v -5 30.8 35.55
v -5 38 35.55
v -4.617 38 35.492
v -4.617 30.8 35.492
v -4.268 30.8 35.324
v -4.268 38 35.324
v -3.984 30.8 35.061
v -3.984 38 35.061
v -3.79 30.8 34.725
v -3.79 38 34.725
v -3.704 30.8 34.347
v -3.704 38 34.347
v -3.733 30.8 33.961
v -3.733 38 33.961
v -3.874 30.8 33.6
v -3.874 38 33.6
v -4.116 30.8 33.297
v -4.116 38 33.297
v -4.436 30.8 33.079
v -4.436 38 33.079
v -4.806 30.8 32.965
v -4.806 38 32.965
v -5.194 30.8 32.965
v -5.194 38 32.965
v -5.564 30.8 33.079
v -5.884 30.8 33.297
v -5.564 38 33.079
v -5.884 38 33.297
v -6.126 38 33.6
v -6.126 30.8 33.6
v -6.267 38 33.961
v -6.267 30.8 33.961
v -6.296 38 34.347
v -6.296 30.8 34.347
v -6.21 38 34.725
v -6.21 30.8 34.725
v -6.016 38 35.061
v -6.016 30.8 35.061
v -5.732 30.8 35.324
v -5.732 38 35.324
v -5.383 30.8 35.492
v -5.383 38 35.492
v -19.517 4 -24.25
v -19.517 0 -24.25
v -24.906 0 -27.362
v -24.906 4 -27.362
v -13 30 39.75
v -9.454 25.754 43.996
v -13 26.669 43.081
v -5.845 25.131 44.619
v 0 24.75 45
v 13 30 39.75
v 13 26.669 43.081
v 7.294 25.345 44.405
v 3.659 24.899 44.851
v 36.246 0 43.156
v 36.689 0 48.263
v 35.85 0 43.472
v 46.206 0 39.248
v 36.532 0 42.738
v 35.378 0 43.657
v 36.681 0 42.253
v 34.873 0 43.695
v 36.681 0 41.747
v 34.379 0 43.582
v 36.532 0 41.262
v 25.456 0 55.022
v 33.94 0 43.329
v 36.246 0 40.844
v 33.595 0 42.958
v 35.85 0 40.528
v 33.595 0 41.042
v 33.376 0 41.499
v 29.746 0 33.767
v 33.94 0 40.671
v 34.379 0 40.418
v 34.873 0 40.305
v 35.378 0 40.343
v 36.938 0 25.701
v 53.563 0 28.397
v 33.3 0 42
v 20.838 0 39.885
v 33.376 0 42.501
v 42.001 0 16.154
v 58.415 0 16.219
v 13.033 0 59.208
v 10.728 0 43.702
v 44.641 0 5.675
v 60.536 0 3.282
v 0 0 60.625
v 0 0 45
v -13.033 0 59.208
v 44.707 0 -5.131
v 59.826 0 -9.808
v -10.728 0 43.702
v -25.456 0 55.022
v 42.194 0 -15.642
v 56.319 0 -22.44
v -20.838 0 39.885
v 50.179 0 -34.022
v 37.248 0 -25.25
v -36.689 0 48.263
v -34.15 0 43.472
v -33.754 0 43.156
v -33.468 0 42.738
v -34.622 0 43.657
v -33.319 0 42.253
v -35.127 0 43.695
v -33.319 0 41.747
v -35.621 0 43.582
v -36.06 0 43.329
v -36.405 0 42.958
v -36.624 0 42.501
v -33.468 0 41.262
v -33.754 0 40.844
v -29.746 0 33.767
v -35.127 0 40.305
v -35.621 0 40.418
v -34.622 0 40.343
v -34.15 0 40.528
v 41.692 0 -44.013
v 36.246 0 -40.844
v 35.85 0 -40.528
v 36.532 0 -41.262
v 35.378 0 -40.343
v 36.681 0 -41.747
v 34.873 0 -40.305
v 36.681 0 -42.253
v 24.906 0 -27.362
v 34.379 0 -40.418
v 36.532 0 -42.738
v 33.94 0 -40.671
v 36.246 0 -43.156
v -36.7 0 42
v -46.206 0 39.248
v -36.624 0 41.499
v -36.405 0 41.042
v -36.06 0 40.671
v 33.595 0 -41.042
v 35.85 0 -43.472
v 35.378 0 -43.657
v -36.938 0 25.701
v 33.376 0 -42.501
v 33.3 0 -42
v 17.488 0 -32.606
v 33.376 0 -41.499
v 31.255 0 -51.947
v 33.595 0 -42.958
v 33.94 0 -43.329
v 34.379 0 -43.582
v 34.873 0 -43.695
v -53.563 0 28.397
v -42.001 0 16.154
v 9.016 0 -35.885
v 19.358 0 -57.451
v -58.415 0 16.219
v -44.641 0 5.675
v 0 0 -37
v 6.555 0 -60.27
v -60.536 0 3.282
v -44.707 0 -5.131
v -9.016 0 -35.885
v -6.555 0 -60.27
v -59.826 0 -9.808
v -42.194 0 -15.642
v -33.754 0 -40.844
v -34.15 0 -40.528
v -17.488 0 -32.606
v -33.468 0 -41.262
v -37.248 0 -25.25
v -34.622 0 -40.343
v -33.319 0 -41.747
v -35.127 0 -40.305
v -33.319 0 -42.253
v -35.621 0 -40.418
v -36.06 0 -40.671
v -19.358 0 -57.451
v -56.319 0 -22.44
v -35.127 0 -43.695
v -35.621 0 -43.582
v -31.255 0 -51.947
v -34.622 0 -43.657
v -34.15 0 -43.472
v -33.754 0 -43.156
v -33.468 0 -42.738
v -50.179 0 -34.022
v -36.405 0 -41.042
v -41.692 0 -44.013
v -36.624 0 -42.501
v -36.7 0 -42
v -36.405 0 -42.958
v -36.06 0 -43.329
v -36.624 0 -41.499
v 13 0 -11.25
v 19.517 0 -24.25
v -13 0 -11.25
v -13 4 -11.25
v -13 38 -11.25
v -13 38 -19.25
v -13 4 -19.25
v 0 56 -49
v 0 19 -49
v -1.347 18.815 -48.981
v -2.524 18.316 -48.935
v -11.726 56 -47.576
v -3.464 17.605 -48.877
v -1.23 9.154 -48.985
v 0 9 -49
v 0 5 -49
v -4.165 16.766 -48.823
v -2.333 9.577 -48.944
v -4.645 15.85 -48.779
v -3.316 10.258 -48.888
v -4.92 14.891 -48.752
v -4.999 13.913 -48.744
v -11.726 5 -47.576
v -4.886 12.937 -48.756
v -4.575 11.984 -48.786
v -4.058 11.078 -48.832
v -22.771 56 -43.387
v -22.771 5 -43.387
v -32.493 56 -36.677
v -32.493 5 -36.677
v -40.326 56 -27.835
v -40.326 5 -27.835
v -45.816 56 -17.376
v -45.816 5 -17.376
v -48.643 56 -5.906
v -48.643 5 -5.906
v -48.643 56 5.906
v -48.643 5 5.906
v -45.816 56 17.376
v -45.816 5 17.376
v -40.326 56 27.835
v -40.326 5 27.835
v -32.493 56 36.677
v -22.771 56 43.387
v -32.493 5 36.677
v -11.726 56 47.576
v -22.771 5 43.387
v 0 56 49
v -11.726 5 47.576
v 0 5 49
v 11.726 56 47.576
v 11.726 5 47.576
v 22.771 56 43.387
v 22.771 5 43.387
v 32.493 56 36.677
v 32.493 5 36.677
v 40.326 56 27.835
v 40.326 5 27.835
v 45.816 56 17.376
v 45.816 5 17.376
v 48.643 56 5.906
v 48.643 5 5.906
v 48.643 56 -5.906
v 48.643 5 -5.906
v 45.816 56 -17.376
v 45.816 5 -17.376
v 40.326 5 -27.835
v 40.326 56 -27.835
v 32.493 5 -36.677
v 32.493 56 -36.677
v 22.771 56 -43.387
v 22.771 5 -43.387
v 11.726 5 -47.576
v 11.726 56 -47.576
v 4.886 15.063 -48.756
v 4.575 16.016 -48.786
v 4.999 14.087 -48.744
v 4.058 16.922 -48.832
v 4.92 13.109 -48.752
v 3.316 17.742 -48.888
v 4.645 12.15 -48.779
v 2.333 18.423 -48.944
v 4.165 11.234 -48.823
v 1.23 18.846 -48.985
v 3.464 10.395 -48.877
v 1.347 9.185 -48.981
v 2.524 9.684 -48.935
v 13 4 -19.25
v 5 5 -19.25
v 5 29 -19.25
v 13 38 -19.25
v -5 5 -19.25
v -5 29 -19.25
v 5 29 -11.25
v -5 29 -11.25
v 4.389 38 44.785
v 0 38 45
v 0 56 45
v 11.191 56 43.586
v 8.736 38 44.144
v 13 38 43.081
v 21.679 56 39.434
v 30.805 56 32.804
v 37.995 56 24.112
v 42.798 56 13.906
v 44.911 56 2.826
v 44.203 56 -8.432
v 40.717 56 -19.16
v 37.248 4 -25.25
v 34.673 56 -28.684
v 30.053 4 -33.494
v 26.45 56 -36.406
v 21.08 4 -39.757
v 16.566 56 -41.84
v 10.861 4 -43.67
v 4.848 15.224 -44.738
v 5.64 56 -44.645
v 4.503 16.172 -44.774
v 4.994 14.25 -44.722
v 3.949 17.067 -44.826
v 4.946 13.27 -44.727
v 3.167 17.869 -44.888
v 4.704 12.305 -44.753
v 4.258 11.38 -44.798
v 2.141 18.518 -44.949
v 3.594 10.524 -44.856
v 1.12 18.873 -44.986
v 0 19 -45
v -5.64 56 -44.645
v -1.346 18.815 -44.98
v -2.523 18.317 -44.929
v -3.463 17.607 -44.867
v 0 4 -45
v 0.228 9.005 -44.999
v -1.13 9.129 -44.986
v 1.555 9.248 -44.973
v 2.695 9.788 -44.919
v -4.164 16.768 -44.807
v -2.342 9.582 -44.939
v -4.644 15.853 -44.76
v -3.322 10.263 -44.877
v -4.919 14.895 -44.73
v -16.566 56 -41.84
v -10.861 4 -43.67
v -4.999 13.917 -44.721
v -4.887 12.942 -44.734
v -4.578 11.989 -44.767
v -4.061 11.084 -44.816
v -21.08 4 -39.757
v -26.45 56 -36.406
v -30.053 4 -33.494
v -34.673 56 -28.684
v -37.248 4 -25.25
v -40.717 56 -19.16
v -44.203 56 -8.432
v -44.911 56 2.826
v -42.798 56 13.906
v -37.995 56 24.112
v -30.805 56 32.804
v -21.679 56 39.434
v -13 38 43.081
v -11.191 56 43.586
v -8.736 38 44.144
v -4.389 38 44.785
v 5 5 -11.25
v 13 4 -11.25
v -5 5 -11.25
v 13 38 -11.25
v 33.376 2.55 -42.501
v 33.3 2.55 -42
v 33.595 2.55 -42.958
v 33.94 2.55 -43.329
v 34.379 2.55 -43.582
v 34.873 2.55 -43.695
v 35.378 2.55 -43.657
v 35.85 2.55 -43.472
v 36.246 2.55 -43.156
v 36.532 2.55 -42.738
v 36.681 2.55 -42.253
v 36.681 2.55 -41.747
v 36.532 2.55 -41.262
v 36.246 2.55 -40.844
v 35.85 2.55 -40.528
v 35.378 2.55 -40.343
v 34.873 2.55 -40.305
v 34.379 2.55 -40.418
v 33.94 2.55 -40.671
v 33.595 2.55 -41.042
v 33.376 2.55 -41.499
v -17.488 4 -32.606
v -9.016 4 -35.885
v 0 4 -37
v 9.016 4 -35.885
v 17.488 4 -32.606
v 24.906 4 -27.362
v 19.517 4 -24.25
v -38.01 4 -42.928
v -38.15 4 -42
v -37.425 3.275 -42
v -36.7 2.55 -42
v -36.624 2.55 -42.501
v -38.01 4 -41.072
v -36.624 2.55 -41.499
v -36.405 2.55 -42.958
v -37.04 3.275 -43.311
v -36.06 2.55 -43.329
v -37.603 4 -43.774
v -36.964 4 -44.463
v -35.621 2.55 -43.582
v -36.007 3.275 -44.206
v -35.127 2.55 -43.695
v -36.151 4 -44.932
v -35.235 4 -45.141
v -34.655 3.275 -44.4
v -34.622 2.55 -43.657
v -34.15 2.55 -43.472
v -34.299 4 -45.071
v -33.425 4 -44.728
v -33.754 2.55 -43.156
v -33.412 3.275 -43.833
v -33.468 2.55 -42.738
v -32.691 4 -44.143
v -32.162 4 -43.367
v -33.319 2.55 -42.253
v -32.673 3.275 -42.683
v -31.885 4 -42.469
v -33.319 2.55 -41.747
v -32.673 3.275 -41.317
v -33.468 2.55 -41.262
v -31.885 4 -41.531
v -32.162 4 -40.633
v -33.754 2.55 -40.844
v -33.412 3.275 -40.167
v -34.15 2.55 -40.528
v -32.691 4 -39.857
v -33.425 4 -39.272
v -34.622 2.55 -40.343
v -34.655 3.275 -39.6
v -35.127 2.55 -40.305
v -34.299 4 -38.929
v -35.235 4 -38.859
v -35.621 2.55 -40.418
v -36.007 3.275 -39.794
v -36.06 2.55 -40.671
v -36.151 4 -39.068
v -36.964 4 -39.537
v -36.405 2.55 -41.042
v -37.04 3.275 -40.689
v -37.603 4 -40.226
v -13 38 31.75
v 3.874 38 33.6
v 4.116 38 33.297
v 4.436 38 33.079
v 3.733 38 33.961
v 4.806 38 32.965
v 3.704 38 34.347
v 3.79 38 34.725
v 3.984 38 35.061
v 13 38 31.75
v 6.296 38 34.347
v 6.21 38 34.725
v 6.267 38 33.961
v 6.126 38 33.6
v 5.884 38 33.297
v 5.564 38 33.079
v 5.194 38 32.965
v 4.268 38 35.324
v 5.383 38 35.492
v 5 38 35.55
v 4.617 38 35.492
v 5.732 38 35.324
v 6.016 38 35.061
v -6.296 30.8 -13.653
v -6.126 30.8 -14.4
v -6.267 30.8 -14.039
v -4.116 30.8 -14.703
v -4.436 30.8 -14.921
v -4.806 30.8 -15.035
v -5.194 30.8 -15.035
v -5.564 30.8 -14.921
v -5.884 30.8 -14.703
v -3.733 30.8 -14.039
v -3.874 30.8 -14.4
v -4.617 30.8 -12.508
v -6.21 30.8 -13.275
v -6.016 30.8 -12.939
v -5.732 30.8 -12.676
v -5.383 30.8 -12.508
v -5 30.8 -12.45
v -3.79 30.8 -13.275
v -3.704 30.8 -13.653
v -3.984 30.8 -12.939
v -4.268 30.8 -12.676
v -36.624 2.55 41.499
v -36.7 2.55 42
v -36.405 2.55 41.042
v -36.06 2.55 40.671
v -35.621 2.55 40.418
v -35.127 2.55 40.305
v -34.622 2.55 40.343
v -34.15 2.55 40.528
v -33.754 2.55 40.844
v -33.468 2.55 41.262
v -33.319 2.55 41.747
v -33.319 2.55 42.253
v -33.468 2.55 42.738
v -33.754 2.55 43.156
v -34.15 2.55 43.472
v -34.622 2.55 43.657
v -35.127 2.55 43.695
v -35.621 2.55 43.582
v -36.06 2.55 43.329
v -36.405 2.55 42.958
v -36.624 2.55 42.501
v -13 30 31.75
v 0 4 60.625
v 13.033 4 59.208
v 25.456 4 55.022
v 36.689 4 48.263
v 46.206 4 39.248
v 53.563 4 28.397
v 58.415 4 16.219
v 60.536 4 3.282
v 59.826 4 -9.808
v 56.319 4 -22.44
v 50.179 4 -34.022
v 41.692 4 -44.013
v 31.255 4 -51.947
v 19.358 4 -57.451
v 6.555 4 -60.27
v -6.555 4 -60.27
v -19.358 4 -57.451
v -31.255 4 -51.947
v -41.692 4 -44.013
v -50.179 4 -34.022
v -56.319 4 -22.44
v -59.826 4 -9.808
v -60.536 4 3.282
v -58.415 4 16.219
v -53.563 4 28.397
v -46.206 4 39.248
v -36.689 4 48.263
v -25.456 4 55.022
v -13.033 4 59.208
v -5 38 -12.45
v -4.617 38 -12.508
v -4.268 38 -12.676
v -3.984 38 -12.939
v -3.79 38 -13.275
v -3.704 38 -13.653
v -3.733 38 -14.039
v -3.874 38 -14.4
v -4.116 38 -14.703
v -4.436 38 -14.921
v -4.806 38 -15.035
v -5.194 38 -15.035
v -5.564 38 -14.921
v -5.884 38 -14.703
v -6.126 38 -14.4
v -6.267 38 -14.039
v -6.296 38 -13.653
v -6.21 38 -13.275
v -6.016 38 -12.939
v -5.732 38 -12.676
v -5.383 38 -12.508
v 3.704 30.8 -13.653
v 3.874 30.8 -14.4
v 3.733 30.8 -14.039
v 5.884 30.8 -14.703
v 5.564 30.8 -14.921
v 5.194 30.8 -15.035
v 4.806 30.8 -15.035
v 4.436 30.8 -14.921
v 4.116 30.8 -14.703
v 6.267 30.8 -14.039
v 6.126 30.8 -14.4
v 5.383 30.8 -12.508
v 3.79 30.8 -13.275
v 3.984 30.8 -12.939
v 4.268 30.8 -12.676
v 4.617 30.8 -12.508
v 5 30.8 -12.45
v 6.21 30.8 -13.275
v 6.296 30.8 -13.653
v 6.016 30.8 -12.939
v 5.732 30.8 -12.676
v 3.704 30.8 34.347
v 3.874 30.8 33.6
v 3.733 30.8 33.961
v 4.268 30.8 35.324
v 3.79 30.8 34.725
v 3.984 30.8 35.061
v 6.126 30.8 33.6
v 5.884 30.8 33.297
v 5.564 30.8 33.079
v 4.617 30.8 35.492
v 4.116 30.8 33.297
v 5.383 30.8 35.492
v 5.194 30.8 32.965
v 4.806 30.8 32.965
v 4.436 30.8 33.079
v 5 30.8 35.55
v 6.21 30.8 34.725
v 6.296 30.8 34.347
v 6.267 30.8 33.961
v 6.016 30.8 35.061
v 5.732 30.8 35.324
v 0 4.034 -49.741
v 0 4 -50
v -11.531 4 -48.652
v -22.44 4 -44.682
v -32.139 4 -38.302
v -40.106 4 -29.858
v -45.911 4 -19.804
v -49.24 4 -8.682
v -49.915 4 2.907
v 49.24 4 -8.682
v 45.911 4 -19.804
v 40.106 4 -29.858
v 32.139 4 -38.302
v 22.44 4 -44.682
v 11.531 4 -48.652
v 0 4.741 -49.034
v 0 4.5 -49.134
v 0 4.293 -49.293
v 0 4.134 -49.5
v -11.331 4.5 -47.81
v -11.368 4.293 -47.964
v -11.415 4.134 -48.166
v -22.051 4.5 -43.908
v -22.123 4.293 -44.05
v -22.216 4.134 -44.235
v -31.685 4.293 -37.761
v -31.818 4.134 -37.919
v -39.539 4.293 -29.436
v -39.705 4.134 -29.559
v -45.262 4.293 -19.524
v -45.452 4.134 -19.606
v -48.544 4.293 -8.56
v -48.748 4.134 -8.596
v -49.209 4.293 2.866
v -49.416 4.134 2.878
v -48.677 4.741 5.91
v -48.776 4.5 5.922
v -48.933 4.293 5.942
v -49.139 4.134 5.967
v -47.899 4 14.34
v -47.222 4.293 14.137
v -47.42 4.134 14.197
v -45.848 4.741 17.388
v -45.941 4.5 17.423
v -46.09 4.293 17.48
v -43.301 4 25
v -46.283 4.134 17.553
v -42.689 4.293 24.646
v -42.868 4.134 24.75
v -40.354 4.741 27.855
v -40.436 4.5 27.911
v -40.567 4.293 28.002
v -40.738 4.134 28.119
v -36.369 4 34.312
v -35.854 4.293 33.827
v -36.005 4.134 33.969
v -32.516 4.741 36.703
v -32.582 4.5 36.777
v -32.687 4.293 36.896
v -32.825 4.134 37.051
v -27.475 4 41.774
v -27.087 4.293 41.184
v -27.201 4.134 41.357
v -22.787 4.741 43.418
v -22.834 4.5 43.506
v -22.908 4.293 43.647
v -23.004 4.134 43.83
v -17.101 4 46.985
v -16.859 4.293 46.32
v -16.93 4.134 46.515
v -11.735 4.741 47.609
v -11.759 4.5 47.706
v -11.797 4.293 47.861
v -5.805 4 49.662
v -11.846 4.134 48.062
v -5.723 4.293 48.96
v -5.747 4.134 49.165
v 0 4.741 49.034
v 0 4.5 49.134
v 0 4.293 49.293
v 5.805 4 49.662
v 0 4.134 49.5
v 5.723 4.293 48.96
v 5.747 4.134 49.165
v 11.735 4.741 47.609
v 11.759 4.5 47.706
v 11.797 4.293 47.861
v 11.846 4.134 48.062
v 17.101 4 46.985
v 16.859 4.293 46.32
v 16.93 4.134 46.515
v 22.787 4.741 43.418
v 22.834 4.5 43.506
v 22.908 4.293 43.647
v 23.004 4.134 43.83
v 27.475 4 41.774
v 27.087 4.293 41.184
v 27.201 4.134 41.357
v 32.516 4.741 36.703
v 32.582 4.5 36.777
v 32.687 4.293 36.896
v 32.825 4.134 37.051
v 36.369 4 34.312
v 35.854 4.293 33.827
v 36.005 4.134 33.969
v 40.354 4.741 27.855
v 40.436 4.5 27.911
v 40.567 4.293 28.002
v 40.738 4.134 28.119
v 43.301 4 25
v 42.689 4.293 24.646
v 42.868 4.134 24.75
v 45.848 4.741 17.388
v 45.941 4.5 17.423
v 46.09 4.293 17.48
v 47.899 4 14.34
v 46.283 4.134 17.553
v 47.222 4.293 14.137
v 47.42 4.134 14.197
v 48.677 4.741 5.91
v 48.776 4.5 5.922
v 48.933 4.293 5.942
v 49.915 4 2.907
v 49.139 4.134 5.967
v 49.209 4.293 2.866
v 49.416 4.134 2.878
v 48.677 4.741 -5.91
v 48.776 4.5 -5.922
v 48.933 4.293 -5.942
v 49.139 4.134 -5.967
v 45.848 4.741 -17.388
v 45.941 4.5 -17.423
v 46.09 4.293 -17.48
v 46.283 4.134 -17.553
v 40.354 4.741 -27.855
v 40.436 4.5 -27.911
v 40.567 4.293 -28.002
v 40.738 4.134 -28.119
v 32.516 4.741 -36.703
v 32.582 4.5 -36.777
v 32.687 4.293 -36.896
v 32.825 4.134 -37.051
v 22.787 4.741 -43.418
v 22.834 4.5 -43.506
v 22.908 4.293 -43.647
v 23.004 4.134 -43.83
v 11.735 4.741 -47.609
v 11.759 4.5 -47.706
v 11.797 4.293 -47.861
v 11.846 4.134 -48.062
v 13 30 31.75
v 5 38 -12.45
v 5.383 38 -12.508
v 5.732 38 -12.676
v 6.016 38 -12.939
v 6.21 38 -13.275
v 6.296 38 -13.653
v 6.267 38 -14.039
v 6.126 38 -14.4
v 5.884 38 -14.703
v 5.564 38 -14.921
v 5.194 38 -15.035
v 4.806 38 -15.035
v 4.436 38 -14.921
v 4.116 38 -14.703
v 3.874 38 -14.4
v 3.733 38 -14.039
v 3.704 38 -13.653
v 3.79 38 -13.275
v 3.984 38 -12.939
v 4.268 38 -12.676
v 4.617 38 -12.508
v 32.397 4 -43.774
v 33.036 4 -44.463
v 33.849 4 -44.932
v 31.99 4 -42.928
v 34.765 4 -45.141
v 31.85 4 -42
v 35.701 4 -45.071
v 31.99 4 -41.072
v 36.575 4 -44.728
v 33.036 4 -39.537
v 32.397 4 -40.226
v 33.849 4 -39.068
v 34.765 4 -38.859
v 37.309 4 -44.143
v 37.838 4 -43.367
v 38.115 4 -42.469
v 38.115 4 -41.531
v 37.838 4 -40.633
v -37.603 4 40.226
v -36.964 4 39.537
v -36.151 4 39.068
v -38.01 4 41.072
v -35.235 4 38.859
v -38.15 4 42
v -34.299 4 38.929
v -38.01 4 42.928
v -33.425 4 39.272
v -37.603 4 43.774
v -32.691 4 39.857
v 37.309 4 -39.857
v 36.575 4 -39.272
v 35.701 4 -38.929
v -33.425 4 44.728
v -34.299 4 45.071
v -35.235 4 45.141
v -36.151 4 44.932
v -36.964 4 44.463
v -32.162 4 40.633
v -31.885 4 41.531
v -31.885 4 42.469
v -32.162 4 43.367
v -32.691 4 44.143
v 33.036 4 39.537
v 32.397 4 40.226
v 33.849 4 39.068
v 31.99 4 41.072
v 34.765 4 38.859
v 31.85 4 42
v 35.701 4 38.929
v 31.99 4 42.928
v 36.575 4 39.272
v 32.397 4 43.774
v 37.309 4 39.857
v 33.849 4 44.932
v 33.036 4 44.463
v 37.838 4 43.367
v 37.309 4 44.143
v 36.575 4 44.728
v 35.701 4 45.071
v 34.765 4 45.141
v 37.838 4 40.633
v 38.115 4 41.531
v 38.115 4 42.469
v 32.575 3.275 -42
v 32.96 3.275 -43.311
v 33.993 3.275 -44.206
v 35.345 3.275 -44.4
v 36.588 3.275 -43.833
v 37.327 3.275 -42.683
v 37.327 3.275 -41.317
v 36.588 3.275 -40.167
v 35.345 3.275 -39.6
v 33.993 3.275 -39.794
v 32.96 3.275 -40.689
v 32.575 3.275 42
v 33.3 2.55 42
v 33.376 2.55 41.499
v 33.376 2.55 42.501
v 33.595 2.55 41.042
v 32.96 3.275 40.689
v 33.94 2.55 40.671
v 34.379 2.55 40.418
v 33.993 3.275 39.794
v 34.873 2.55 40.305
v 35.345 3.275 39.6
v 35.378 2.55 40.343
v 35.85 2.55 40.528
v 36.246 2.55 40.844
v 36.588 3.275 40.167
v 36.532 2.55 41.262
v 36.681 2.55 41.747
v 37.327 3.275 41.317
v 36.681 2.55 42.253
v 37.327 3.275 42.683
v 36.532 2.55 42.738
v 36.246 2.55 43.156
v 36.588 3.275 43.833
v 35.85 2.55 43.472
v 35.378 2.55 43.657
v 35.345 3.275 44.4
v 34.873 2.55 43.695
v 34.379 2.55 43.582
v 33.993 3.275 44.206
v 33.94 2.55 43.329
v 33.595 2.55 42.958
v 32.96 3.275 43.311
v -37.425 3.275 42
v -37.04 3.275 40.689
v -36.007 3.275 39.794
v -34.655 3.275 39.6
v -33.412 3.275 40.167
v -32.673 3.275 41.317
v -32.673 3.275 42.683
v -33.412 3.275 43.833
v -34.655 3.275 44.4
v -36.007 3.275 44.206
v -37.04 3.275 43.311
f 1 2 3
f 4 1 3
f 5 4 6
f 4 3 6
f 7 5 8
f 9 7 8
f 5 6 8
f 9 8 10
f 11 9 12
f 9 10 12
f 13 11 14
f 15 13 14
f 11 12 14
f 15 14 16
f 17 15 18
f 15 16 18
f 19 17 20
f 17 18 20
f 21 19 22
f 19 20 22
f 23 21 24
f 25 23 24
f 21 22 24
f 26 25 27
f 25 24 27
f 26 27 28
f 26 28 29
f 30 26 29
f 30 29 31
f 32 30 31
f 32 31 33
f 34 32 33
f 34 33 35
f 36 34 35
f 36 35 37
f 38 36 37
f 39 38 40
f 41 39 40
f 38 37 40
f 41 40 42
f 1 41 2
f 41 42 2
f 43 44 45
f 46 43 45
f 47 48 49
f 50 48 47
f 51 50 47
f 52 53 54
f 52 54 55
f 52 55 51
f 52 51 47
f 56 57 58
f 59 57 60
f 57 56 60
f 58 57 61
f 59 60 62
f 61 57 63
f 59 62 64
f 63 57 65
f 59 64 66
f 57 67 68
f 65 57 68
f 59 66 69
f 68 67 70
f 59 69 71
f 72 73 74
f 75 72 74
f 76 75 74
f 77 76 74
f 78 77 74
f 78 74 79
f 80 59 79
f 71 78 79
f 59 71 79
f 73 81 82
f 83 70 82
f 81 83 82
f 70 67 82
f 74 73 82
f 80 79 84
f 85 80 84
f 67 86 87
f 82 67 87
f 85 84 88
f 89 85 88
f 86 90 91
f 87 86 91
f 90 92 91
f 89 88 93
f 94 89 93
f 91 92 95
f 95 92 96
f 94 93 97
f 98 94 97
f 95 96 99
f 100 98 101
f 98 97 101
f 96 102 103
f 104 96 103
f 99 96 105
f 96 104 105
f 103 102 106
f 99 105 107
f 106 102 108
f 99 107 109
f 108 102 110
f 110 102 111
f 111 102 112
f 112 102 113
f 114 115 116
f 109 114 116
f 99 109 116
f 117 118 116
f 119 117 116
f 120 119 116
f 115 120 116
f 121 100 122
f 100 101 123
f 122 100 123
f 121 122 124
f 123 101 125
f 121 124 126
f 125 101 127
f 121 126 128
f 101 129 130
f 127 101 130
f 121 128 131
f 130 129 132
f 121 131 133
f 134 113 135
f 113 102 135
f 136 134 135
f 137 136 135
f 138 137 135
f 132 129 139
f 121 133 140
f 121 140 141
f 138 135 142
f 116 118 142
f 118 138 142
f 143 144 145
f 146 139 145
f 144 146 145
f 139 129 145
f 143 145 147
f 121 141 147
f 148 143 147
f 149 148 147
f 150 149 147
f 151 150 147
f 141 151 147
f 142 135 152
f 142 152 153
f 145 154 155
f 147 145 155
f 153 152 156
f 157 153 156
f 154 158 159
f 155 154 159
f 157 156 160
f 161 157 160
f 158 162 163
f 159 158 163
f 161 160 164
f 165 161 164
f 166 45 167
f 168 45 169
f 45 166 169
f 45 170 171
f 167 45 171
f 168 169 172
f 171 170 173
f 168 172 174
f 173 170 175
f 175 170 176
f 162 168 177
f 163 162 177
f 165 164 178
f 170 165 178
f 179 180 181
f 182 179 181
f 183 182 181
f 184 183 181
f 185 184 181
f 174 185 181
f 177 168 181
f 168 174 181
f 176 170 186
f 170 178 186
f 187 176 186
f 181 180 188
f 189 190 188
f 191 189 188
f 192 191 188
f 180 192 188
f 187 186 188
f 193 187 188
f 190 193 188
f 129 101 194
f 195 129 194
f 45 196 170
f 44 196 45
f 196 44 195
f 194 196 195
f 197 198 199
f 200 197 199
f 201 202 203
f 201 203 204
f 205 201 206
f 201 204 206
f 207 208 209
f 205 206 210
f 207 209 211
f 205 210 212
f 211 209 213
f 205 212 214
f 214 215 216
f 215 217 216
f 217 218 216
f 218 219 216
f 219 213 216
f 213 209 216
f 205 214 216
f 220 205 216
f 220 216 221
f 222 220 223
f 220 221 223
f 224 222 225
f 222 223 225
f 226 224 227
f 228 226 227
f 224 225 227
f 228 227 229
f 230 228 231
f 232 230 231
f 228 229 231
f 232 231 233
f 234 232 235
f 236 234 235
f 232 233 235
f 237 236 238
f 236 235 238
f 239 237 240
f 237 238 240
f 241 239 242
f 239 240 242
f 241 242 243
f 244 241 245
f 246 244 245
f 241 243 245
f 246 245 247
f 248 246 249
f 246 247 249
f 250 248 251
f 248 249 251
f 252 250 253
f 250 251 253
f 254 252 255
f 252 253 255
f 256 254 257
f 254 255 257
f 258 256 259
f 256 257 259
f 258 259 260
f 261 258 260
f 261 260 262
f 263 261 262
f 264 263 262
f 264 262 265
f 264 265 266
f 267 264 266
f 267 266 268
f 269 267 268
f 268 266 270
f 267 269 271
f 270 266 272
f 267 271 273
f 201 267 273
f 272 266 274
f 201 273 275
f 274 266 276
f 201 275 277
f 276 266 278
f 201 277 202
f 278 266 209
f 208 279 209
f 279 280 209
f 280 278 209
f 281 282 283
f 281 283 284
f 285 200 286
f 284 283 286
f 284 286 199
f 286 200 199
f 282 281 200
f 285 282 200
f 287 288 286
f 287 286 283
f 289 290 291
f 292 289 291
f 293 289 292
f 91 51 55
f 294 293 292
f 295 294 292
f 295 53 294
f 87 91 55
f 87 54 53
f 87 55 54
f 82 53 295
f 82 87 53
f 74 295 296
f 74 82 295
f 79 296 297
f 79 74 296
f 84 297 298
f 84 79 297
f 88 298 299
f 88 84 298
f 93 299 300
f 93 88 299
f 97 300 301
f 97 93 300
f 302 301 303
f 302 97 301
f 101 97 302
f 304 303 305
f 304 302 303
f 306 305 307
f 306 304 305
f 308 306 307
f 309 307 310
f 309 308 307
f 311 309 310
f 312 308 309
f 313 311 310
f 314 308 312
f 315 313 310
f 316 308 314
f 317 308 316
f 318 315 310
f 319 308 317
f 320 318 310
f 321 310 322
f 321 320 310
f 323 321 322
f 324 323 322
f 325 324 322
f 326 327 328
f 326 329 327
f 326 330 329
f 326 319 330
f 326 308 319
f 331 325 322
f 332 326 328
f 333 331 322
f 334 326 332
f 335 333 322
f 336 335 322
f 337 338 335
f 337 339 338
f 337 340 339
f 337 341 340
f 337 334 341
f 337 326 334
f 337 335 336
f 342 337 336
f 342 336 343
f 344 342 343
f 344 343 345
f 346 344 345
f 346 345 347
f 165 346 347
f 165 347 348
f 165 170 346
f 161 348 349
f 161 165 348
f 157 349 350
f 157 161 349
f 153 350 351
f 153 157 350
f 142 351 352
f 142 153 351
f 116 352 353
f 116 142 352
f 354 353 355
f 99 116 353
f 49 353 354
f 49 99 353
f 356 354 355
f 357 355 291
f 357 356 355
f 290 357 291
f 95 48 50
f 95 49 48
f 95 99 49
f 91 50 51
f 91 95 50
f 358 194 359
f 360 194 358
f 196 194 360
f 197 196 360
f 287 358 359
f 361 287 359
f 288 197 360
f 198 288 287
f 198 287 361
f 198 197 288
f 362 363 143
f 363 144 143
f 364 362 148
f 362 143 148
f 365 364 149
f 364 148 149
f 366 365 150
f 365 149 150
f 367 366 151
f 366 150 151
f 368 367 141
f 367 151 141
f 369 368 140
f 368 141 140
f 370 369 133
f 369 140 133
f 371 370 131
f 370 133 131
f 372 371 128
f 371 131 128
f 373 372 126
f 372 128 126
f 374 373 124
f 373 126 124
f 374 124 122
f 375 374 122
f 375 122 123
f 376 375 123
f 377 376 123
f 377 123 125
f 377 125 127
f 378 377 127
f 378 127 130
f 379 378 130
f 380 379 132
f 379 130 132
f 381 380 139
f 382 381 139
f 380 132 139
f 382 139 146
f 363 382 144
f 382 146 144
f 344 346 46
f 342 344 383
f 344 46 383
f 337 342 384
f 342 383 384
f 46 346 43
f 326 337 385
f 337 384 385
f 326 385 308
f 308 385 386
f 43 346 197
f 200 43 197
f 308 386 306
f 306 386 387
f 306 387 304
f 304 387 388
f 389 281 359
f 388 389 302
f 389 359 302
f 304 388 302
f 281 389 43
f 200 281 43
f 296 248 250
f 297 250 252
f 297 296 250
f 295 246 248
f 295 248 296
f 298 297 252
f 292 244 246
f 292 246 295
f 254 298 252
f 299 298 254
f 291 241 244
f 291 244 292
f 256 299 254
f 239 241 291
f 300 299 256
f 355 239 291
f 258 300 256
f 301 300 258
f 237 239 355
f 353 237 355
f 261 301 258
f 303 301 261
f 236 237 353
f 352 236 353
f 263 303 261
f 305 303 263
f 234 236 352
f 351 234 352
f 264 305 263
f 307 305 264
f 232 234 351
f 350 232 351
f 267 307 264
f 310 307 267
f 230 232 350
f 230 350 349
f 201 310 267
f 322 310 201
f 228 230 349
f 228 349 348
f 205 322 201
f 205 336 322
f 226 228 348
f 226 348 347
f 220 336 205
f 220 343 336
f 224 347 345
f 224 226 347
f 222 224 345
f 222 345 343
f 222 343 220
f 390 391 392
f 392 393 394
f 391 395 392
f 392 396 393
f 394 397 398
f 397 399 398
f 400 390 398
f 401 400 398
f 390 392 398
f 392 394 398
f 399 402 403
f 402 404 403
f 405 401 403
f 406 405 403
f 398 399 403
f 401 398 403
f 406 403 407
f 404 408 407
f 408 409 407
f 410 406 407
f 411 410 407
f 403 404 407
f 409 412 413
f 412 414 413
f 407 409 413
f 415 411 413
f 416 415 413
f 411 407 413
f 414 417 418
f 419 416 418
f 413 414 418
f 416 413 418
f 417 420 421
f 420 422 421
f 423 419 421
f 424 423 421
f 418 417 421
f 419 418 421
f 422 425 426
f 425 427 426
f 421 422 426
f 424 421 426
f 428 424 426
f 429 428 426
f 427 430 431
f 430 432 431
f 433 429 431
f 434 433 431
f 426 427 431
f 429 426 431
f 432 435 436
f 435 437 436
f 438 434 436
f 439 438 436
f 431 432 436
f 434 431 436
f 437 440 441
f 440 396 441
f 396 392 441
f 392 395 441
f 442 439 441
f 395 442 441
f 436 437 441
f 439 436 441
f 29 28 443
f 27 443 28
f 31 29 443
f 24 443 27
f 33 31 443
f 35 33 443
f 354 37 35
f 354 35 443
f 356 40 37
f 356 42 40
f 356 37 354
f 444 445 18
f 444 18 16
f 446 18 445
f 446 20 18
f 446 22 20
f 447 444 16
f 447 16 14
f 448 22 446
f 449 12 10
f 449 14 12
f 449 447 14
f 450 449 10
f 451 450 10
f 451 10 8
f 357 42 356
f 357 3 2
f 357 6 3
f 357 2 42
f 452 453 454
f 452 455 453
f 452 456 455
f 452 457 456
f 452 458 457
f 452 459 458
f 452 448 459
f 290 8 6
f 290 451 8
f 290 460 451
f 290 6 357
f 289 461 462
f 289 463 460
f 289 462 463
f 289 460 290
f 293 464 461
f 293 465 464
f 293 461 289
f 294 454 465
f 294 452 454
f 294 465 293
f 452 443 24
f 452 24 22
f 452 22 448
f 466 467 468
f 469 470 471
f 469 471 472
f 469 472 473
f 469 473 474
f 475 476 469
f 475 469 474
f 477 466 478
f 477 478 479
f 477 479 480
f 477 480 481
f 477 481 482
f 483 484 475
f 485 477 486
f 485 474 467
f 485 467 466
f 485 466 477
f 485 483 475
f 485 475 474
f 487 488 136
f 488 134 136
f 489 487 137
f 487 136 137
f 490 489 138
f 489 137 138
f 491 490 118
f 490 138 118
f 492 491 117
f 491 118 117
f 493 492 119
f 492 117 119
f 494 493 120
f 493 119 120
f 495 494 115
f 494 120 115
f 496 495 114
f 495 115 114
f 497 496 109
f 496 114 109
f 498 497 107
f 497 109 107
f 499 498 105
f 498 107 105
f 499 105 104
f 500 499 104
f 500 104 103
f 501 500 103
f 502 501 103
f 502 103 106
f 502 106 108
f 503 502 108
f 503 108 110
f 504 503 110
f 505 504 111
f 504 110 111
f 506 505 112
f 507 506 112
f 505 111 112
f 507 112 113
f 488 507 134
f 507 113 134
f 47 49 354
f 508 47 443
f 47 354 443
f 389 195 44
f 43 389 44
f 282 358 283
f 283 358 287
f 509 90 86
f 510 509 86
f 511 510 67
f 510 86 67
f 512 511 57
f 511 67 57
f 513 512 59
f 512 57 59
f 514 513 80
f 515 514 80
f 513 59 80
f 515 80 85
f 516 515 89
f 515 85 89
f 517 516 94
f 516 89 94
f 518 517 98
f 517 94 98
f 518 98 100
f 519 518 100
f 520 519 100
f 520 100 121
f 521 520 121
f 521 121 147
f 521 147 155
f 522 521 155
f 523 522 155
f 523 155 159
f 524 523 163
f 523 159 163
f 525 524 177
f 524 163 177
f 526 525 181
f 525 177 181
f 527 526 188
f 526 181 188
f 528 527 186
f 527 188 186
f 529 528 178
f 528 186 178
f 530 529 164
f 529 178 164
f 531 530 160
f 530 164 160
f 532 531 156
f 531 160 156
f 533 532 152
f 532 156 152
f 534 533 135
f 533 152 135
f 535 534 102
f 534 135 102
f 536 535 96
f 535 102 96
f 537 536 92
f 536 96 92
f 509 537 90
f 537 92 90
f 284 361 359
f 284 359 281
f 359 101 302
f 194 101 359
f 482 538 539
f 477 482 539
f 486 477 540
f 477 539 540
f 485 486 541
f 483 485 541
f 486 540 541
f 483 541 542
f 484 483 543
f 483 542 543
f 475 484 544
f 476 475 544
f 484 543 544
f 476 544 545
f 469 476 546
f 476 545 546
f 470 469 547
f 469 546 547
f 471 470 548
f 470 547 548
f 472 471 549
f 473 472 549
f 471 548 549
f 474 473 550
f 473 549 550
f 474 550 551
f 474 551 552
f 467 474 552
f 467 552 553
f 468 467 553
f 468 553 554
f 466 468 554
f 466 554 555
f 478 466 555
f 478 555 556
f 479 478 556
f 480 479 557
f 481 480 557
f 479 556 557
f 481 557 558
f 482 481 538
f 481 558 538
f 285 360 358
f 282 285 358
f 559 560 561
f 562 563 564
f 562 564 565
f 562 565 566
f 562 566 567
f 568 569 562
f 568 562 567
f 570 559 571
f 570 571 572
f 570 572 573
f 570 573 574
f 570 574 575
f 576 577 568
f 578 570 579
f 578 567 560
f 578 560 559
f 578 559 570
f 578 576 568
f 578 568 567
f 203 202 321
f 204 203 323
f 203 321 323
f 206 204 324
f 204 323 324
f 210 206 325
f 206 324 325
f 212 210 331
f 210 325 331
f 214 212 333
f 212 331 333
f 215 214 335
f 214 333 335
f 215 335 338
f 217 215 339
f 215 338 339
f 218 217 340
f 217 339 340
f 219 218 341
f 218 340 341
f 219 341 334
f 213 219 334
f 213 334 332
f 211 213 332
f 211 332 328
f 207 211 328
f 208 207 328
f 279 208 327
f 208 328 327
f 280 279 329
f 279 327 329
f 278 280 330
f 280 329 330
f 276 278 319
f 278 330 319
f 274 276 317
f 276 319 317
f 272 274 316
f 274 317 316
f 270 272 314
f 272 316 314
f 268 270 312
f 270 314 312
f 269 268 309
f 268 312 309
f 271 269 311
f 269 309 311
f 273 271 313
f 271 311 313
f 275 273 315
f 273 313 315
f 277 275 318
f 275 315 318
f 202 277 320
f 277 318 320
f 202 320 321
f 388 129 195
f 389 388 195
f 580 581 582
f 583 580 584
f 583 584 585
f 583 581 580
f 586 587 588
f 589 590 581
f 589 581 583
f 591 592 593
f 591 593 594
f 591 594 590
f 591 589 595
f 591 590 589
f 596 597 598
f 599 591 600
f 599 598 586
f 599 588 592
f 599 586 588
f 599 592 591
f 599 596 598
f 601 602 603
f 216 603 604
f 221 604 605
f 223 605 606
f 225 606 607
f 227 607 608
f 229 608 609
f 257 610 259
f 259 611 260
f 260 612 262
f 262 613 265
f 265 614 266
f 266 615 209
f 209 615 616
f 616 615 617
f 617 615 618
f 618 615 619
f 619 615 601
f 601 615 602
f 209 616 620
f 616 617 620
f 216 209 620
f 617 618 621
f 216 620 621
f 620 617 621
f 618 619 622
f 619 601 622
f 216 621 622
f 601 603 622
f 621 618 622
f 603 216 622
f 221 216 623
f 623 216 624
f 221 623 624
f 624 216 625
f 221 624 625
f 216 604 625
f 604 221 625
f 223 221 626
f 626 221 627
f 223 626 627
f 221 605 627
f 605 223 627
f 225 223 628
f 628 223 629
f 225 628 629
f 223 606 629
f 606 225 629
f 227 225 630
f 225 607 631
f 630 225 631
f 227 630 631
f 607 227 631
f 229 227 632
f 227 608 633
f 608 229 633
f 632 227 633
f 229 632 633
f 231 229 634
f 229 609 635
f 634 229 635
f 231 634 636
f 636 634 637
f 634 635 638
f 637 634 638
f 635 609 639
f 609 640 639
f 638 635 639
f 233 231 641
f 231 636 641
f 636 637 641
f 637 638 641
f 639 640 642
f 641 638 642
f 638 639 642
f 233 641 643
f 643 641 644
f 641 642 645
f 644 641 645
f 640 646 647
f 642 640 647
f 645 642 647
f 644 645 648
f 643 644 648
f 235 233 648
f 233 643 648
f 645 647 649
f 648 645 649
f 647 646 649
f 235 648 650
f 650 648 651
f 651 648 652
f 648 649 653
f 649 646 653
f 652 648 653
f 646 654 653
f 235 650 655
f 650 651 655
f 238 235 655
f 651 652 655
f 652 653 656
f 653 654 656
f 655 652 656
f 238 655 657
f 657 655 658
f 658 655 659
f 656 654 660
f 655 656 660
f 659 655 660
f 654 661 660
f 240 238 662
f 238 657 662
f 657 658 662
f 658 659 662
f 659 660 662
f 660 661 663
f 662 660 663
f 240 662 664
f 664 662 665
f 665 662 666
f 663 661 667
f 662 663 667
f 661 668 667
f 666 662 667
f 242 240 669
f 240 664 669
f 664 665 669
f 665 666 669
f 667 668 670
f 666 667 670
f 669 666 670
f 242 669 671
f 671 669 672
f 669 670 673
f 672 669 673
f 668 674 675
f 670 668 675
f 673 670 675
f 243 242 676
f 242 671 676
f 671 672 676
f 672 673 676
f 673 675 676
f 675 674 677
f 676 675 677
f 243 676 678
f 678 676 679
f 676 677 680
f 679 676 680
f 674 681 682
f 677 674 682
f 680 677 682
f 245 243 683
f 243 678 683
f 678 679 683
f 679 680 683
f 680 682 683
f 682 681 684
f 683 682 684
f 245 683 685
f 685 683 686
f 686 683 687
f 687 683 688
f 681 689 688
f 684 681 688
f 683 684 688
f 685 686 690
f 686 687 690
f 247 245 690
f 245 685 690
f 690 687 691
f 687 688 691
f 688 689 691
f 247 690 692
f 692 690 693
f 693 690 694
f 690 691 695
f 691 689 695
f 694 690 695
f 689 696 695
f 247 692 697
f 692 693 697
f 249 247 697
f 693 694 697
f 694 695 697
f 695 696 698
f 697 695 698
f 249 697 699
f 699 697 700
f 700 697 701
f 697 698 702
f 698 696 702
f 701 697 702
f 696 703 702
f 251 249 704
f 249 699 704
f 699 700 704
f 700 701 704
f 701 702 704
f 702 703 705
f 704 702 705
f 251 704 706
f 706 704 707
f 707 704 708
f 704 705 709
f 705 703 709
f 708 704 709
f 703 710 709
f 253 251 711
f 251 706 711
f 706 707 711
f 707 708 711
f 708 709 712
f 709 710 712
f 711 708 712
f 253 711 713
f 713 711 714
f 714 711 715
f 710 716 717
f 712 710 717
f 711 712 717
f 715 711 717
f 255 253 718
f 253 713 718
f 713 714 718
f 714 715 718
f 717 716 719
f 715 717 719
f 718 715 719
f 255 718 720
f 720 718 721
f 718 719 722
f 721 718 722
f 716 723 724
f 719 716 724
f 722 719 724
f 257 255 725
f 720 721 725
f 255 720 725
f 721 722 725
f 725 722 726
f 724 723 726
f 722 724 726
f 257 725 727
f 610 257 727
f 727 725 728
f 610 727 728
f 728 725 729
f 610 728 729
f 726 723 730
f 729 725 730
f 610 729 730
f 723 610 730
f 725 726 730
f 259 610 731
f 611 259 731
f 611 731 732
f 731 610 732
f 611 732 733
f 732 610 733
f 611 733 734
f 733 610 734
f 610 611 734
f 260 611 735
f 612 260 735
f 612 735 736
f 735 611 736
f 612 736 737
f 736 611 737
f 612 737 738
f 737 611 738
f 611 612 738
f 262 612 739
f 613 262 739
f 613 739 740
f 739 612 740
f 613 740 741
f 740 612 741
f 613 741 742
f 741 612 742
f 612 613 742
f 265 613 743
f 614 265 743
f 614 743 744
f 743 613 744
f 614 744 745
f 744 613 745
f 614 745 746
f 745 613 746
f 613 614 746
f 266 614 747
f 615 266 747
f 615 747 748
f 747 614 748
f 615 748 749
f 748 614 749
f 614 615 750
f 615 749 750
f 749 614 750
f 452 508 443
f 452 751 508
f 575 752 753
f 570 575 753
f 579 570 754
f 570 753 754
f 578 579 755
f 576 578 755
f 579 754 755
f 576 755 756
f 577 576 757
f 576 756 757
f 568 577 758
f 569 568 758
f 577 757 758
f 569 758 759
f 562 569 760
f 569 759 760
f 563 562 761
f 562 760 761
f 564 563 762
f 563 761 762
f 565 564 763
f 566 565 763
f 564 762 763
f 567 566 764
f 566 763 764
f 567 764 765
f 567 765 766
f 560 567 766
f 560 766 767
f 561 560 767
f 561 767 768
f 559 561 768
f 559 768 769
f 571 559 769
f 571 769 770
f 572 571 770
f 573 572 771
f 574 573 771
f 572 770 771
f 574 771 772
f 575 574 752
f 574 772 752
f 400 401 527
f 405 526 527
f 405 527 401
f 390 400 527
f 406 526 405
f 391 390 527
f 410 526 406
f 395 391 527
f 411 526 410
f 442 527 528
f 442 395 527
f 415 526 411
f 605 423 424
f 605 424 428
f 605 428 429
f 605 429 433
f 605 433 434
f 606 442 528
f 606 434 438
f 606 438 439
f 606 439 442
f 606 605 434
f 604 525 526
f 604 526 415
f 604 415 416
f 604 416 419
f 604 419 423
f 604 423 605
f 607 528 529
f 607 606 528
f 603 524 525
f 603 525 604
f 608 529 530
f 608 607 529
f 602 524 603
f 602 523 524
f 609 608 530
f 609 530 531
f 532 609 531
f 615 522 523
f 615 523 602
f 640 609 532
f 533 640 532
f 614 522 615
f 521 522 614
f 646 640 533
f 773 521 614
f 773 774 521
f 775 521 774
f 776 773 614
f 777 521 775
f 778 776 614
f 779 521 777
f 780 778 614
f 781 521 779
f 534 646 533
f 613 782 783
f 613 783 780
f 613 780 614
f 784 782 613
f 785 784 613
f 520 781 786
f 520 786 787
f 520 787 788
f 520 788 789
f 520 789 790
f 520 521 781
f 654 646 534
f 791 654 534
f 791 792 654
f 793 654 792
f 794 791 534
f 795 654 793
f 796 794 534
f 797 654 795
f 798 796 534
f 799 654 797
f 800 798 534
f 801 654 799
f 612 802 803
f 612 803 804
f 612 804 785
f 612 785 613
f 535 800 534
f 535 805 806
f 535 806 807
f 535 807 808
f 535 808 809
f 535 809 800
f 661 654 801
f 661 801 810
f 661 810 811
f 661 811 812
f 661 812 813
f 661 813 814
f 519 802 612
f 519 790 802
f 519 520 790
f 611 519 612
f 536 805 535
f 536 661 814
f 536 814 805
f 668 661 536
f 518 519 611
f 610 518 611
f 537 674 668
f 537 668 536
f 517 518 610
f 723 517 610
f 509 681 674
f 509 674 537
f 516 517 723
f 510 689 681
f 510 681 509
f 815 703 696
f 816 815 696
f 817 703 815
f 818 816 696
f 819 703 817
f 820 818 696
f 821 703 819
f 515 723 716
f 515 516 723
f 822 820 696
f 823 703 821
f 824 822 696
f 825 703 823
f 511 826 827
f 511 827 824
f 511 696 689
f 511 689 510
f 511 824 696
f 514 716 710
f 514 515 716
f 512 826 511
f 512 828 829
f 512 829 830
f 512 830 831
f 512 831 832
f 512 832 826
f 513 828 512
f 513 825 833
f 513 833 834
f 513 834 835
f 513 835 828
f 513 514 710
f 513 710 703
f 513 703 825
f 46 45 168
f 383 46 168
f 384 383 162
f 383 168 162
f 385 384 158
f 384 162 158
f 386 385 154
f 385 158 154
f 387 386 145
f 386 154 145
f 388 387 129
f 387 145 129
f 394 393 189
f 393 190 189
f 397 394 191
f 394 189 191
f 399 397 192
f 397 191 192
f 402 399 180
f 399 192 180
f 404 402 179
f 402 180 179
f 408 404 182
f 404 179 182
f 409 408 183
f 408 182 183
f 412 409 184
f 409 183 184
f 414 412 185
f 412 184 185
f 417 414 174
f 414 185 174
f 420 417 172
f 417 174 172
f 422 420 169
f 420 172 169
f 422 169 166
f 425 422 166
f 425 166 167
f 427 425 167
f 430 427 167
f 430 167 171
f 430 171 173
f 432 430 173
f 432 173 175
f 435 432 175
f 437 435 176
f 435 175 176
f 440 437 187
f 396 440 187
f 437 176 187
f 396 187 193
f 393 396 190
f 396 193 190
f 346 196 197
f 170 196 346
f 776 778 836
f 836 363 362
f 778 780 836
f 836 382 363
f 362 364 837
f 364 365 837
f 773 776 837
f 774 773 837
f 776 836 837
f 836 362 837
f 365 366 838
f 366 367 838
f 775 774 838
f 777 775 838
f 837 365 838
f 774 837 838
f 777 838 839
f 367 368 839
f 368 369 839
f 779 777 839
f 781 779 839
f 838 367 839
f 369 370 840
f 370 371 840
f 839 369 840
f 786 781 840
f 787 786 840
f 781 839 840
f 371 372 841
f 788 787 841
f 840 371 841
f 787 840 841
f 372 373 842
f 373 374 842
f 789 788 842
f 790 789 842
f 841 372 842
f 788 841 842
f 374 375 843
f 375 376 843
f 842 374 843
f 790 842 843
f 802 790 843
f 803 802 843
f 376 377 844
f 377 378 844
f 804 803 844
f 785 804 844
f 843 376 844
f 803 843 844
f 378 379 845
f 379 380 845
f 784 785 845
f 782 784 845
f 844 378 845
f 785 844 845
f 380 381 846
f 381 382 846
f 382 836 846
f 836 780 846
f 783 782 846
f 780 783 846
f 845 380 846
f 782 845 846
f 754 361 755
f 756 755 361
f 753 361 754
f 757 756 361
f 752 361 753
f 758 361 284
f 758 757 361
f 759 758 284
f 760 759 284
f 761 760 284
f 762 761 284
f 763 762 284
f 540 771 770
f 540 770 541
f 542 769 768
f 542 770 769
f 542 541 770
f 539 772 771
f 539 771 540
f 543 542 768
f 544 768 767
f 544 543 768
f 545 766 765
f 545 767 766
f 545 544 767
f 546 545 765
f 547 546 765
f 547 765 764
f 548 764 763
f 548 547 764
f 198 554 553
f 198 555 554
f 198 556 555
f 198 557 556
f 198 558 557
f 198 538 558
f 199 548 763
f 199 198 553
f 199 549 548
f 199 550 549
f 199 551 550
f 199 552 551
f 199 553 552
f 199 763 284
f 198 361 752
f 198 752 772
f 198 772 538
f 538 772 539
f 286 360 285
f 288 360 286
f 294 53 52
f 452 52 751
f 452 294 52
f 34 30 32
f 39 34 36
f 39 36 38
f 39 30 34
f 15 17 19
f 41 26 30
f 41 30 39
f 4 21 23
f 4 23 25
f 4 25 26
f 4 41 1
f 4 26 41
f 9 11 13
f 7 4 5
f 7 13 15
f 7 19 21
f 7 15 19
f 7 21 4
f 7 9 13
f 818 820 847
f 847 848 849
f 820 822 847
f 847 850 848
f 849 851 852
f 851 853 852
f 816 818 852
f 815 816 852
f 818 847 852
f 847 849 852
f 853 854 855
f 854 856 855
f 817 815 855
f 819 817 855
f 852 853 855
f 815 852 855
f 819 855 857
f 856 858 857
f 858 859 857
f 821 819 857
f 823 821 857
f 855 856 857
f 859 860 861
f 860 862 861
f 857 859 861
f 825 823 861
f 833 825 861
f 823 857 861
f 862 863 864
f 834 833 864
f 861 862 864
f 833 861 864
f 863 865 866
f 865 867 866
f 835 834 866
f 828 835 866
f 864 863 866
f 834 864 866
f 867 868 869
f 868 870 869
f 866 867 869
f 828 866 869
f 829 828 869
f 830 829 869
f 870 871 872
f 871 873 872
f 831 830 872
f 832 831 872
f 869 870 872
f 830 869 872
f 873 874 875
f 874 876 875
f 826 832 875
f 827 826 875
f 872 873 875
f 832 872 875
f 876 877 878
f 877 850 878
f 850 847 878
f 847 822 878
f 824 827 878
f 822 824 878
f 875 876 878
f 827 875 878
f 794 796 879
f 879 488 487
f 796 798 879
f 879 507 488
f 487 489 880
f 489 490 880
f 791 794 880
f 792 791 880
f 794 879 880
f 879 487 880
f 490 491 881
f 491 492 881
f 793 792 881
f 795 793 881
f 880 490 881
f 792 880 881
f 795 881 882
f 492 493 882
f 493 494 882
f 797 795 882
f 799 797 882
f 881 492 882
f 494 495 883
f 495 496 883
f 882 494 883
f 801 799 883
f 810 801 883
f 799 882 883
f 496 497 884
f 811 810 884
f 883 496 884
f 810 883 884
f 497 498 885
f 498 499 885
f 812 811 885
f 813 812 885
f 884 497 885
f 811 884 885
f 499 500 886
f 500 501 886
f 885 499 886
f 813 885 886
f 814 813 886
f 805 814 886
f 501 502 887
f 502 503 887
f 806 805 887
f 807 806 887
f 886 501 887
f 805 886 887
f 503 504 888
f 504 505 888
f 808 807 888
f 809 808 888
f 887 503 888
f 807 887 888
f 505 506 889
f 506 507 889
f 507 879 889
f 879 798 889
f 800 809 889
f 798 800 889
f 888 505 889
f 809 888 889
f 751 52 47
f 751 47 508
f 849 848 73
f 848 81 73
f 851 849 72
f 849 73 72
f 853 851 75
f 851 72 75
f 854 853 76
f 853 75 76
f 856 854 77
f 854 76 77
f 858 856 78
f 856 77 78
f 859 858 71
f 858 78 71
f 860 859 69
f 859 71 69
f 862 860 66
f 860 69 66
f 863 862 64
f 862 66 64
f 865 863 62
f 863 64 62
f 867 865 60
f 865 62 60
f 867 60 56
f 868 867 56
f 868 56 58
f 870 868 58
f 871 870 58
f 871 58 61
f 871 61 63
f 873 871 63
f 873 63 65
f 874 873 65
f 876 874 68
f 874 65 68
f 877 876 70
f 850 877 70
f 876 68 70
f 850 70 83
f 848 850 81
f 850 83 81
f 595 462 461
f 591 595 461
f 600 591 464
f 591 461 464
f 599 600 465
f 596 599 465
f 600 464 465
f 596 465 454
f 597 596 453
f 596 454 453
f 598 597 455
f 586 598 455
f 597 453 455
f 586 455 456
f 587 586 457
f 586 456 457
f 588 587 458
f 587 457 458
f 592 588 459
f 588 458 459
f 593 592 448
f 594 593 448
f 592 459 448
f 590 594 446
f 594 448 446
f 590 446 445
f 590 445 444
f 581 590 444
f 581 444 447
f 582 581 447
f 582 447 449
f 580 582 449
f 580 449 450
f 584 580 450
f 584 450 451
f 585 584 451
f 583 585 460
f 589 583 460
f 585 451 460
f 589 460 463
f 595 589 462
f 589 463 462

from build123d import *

# Parameters (mm, degrees)
SKETCH1_R                                           = 60.625
SKETCH1_R_2                                         = 45
BOSS_EXTRUDE1_DEPTH                                 = 4
SKETCH2_R                                           = 49
SKETCH2_R_2                                         = 45
BOSS_EXTRUDE2_DEPTH                                 = 52
SKETCH3_W                                           = 8
SKETCH3_H                                           = 38
BOSS_EXTRUDE3_DEPTH                                 = 13
SKETCH6_W                                           = 10
SKETCH6_H                                           = 24
CUT_EXTRUDE1_DEPTH                                  = 26
SKETCH7_R                                           = 5
CUT_EXTRUDE2_DEPTH                                  = 58
SKETCH8_R                                           = 1.3
CUT_EXTRUDE3_DEPTH                                  = 7.2
BOSS_EXTRUDE4_DEPTH                                 = 4
CSK_FOR_M3_COUNTERSUNK_FLAT_HEAD_SCREW1_D           = 3.4
CSK_FOR_M3_COUNTERSUNK_FLAT_HEAD_SCREW1_DEPTH       = 4
CSK_FOR_M3_COUNTERSUNK_FLAT_HEAD_SCREW1_CSINK_D     = 6.3
CSK_FOR_M3_COUNTERSUNK_FLAT_HEAD_SCREW1_CSINK_ANGLE = 90
CSK_FOR_M3_COUNTERSUNK_FLAT_HEAD_SCREW1_TIP         = 1.021463052
FILLET1_R                                           = 1


with BuildPart() as part:
    # Sketch1 → Boss-Extrude1 (new body)
    with BuildSketch(Plane(origin=(0, 0, 0), x_dir=(1, 0, 0), z_dir=(0, 1, 0))):
        with Locations(Location((0, 0, 0), (0, 0, 270))):
            Circle(SKETCH1_R)
        with Locations(Location((0, 0, 0), (0, 0, 270))):
            Circle(SKETCH1_R_2, mode=Mode.SUBTRACT)
    extrude(amount=BOSS_EXTRUDE1_DEPTH)

    # Sketch2 → Boss-Extrude2 (add)
    with BuildSketch(Plane(origin=(0, 4, 0), x_dir=(1, 0, 0), z_dir=(0, 1, 0))):
        with Locations(Location((0, 0, 0), (0, 0, 90))):
            Circle(SKETCH2_R)
        with Locations(Location((0, 0, 0), (0, 0, 270))):
            Circle(SKETCH2_R_2, mode=Mode.SUBTRACT)
    extrude(amount=BOSS_EXTRUDE2_DEPTH)

    # Sketch3 → Boss-Extrude3 (add, symmetric)
    with BuildSketch(Plane(origin=(0, 0, 0), x_dir=(0, 0, -1), z_dir=(1, 0, 0))):
        with Locations((15.25, 19)):
            Rectangle(SKETCH3_W, SKETCH3_H)
        Polygon((-45, 38), (-45, 30), (-39.75, 30), (-31.75, 38), align=None)
        Polygon((-39.75, 30), (-45, 30), (-45, 24.75), align=None)
        Polygon((-31.75, 38), (-39.75, 30), (-31.75, 30), align=None)
    extrude(amount=BOSS_EXTRUDE3_DEPTH, both=True)


with BuildPart() as boss_extrude3_piece_1:
    # of the separate pieces the step leaves, piece 1, a body of its own (boss_extrude3_pieces)
    add(part.part.solids().sort_by_distance((0, 0, 60.625))[0])

    # Sketch7 → Cut-Extrude2 (cut)
    with BuildSketch(Plane.XY.offset(-11.25)):
        with Locations(Location((0, 14, 0), (0, 0, 90))):
            Circle(SKETCH7_R)
    extrude(amount=-CUT_EXTRUDE2_DEPTH, mode=Mode.SUBTRACT)


with BuildPart() as boss_extrude3_piece_2:
    # of the separate pieces the step leaves, piece 2, a body of its own (boss_extrude3_pieces)
    add(part.part.solids().sort_by_distance((-13, 38, -19.25))[0])

    # Sketch6 → Cut-Extrude1 (cut)
    with BuildSketch(Plane.XY.offset(-11.25)):
        with Locations((0, 17)):
            Rectangle(SKETCH6_W, SKETCH6_H)
    extrude(amount=-CUT_EXTRUDE1_DEPTH, mode=Mode.SUBTRACT)


with BuildPart() as cut_extrude3_tool:
    # Sketch8 → Cut-Extrude3 (new body)
    with BuildSketch(Plane(origin=(0, 38, 0), x_dir=(1, 0, 0), z_dir=(0, 1, 0))):
        with Locations(Location((-5, 13.75, 0), (0, 0, 270))):
            Circle(SKETCH8_R)
        with Locations(Location((5, 13.75, 0), (0, 0, 270))):
            Circle(SKETCH8_R)
        with Locations(Location((-5, -34.25, 0), (0, 0, 270))):
            Circle(SKETCH8_R)
        with Locations(Location((5, -34.25, 0), (0, 0, 270))):
            Circle(SKETCH8_R)
    extrude(amount=-CUT_EXTRUDE3_DEPTH)


with BuildPart() as boss_extrude3_piece_1_1:
    add(boss_extrude3_piece_1.part)

    # Cut-Extrude3: cut by cut_extrude3_tool
    add(cut_extrude3_tool.part, mode=Mode.SUBTRACT)



with BuildPart() as boss_extrude3_piece_2_1:
    add(boss_extrude3_piece_2.part)

    # Cut-Extrude3: cut by cut_extrude3_tool
    add(cut_extrude3_tool.part, mode=Mode.SUBTRACT)


with BuildPart() as boss_extrude3_piece_1_2:
    add(boss_extrude3_piece_1_1.part)

    add(boss_extrude3_piece_2_1.part)  # Boss-Extrude4 merges Boss-Extrude3 piece 2
    # Sketch9 → Boss-Extrude4 (add)
    with BuildSketch(Plane.XZ):
        with BuildLine():
            Line((13, -11.25), (-13, -11.25))
            Line((-13, -11.25), (-37.248431585, -25.249838503))
            ThreePointArc((-37.248431585, -25.249838503), (0, -45), (37.248431585, -25.249838503))
            Line((37.248431585, -25.249838503), (13, -11.25))
        make_face()
        with BuildLine():
            Line((-19.516660498, -24.25), (-24.906460381, -27.361802413))
            ThreePointArc((-24.906460381, -27.361802413), (0, -37), (24.906460381, -27.361802413))
            Line((24.906460381, -27.361802413), (19.516660498, -24.25))
            Line((19.516660498, -24.25), (-19.516660498, -24.25))
        make_face(mode=Mode.SUBTRACT)
    extrude(amount=-BOSS_EXTRUDE4_DEPTH)

    # CSK for M3 Countersunk Flat Head Screw1
    with Locations(Plane(origin=(0, 4, 0), x_dir=(1, 0, 0), z_dir=(0, 1, 0))):
        with Locations((-35, 42), (35, 42), (35, -42), (-35, -42)):
            CounterSinkHole(CSK_FOR_M3_COUNTERSUNK_FLAT_HEAD_SCREW1_D / 2, CSK_FOR_M3_COUNTERSUNK_FLAT_HEAD_SCREW1_CSINK_D / 2, depth=CSK_FOR_M3_COUNTERSUNK_FLAT_HEAD_SCREW1_DEPTH, counter_sink_angle=CSK_FOR_M3_COUNTERSUNK_FLAT_HEAD_SCREW1_CSINK_ANGLE)
            with Locations((0, 0, -(CSK_FOR_M3_COUNTERSUNK_FLAT_HEAD_SCREW1_DEPTH + CSK_FOR_M3_COUNTERSUNK_FLAT_HEAD_SCREW1_TIP / 2))):  # 118° drill point
                Cone(0, CSK_FOR_M3_COUNTERSUNK_FLAT_HEAD_SCREW1_D / 2, CSK_FOR_M3_COUNTERSUNK_FLAT_HEAD_SCREW1_TIP, mode=Mode.SUBTRACT)

    # Fillet1
    fillet1_edges = [boss_extrude3_piece_1_2.edges().sort_by_distance(p)[0] for p in [
        (0, 4, 49),
    ]]
    fillet(fillet1_edges, radius=FILLET1_R)


solid = boss_extrude3_piece_1_2.part
